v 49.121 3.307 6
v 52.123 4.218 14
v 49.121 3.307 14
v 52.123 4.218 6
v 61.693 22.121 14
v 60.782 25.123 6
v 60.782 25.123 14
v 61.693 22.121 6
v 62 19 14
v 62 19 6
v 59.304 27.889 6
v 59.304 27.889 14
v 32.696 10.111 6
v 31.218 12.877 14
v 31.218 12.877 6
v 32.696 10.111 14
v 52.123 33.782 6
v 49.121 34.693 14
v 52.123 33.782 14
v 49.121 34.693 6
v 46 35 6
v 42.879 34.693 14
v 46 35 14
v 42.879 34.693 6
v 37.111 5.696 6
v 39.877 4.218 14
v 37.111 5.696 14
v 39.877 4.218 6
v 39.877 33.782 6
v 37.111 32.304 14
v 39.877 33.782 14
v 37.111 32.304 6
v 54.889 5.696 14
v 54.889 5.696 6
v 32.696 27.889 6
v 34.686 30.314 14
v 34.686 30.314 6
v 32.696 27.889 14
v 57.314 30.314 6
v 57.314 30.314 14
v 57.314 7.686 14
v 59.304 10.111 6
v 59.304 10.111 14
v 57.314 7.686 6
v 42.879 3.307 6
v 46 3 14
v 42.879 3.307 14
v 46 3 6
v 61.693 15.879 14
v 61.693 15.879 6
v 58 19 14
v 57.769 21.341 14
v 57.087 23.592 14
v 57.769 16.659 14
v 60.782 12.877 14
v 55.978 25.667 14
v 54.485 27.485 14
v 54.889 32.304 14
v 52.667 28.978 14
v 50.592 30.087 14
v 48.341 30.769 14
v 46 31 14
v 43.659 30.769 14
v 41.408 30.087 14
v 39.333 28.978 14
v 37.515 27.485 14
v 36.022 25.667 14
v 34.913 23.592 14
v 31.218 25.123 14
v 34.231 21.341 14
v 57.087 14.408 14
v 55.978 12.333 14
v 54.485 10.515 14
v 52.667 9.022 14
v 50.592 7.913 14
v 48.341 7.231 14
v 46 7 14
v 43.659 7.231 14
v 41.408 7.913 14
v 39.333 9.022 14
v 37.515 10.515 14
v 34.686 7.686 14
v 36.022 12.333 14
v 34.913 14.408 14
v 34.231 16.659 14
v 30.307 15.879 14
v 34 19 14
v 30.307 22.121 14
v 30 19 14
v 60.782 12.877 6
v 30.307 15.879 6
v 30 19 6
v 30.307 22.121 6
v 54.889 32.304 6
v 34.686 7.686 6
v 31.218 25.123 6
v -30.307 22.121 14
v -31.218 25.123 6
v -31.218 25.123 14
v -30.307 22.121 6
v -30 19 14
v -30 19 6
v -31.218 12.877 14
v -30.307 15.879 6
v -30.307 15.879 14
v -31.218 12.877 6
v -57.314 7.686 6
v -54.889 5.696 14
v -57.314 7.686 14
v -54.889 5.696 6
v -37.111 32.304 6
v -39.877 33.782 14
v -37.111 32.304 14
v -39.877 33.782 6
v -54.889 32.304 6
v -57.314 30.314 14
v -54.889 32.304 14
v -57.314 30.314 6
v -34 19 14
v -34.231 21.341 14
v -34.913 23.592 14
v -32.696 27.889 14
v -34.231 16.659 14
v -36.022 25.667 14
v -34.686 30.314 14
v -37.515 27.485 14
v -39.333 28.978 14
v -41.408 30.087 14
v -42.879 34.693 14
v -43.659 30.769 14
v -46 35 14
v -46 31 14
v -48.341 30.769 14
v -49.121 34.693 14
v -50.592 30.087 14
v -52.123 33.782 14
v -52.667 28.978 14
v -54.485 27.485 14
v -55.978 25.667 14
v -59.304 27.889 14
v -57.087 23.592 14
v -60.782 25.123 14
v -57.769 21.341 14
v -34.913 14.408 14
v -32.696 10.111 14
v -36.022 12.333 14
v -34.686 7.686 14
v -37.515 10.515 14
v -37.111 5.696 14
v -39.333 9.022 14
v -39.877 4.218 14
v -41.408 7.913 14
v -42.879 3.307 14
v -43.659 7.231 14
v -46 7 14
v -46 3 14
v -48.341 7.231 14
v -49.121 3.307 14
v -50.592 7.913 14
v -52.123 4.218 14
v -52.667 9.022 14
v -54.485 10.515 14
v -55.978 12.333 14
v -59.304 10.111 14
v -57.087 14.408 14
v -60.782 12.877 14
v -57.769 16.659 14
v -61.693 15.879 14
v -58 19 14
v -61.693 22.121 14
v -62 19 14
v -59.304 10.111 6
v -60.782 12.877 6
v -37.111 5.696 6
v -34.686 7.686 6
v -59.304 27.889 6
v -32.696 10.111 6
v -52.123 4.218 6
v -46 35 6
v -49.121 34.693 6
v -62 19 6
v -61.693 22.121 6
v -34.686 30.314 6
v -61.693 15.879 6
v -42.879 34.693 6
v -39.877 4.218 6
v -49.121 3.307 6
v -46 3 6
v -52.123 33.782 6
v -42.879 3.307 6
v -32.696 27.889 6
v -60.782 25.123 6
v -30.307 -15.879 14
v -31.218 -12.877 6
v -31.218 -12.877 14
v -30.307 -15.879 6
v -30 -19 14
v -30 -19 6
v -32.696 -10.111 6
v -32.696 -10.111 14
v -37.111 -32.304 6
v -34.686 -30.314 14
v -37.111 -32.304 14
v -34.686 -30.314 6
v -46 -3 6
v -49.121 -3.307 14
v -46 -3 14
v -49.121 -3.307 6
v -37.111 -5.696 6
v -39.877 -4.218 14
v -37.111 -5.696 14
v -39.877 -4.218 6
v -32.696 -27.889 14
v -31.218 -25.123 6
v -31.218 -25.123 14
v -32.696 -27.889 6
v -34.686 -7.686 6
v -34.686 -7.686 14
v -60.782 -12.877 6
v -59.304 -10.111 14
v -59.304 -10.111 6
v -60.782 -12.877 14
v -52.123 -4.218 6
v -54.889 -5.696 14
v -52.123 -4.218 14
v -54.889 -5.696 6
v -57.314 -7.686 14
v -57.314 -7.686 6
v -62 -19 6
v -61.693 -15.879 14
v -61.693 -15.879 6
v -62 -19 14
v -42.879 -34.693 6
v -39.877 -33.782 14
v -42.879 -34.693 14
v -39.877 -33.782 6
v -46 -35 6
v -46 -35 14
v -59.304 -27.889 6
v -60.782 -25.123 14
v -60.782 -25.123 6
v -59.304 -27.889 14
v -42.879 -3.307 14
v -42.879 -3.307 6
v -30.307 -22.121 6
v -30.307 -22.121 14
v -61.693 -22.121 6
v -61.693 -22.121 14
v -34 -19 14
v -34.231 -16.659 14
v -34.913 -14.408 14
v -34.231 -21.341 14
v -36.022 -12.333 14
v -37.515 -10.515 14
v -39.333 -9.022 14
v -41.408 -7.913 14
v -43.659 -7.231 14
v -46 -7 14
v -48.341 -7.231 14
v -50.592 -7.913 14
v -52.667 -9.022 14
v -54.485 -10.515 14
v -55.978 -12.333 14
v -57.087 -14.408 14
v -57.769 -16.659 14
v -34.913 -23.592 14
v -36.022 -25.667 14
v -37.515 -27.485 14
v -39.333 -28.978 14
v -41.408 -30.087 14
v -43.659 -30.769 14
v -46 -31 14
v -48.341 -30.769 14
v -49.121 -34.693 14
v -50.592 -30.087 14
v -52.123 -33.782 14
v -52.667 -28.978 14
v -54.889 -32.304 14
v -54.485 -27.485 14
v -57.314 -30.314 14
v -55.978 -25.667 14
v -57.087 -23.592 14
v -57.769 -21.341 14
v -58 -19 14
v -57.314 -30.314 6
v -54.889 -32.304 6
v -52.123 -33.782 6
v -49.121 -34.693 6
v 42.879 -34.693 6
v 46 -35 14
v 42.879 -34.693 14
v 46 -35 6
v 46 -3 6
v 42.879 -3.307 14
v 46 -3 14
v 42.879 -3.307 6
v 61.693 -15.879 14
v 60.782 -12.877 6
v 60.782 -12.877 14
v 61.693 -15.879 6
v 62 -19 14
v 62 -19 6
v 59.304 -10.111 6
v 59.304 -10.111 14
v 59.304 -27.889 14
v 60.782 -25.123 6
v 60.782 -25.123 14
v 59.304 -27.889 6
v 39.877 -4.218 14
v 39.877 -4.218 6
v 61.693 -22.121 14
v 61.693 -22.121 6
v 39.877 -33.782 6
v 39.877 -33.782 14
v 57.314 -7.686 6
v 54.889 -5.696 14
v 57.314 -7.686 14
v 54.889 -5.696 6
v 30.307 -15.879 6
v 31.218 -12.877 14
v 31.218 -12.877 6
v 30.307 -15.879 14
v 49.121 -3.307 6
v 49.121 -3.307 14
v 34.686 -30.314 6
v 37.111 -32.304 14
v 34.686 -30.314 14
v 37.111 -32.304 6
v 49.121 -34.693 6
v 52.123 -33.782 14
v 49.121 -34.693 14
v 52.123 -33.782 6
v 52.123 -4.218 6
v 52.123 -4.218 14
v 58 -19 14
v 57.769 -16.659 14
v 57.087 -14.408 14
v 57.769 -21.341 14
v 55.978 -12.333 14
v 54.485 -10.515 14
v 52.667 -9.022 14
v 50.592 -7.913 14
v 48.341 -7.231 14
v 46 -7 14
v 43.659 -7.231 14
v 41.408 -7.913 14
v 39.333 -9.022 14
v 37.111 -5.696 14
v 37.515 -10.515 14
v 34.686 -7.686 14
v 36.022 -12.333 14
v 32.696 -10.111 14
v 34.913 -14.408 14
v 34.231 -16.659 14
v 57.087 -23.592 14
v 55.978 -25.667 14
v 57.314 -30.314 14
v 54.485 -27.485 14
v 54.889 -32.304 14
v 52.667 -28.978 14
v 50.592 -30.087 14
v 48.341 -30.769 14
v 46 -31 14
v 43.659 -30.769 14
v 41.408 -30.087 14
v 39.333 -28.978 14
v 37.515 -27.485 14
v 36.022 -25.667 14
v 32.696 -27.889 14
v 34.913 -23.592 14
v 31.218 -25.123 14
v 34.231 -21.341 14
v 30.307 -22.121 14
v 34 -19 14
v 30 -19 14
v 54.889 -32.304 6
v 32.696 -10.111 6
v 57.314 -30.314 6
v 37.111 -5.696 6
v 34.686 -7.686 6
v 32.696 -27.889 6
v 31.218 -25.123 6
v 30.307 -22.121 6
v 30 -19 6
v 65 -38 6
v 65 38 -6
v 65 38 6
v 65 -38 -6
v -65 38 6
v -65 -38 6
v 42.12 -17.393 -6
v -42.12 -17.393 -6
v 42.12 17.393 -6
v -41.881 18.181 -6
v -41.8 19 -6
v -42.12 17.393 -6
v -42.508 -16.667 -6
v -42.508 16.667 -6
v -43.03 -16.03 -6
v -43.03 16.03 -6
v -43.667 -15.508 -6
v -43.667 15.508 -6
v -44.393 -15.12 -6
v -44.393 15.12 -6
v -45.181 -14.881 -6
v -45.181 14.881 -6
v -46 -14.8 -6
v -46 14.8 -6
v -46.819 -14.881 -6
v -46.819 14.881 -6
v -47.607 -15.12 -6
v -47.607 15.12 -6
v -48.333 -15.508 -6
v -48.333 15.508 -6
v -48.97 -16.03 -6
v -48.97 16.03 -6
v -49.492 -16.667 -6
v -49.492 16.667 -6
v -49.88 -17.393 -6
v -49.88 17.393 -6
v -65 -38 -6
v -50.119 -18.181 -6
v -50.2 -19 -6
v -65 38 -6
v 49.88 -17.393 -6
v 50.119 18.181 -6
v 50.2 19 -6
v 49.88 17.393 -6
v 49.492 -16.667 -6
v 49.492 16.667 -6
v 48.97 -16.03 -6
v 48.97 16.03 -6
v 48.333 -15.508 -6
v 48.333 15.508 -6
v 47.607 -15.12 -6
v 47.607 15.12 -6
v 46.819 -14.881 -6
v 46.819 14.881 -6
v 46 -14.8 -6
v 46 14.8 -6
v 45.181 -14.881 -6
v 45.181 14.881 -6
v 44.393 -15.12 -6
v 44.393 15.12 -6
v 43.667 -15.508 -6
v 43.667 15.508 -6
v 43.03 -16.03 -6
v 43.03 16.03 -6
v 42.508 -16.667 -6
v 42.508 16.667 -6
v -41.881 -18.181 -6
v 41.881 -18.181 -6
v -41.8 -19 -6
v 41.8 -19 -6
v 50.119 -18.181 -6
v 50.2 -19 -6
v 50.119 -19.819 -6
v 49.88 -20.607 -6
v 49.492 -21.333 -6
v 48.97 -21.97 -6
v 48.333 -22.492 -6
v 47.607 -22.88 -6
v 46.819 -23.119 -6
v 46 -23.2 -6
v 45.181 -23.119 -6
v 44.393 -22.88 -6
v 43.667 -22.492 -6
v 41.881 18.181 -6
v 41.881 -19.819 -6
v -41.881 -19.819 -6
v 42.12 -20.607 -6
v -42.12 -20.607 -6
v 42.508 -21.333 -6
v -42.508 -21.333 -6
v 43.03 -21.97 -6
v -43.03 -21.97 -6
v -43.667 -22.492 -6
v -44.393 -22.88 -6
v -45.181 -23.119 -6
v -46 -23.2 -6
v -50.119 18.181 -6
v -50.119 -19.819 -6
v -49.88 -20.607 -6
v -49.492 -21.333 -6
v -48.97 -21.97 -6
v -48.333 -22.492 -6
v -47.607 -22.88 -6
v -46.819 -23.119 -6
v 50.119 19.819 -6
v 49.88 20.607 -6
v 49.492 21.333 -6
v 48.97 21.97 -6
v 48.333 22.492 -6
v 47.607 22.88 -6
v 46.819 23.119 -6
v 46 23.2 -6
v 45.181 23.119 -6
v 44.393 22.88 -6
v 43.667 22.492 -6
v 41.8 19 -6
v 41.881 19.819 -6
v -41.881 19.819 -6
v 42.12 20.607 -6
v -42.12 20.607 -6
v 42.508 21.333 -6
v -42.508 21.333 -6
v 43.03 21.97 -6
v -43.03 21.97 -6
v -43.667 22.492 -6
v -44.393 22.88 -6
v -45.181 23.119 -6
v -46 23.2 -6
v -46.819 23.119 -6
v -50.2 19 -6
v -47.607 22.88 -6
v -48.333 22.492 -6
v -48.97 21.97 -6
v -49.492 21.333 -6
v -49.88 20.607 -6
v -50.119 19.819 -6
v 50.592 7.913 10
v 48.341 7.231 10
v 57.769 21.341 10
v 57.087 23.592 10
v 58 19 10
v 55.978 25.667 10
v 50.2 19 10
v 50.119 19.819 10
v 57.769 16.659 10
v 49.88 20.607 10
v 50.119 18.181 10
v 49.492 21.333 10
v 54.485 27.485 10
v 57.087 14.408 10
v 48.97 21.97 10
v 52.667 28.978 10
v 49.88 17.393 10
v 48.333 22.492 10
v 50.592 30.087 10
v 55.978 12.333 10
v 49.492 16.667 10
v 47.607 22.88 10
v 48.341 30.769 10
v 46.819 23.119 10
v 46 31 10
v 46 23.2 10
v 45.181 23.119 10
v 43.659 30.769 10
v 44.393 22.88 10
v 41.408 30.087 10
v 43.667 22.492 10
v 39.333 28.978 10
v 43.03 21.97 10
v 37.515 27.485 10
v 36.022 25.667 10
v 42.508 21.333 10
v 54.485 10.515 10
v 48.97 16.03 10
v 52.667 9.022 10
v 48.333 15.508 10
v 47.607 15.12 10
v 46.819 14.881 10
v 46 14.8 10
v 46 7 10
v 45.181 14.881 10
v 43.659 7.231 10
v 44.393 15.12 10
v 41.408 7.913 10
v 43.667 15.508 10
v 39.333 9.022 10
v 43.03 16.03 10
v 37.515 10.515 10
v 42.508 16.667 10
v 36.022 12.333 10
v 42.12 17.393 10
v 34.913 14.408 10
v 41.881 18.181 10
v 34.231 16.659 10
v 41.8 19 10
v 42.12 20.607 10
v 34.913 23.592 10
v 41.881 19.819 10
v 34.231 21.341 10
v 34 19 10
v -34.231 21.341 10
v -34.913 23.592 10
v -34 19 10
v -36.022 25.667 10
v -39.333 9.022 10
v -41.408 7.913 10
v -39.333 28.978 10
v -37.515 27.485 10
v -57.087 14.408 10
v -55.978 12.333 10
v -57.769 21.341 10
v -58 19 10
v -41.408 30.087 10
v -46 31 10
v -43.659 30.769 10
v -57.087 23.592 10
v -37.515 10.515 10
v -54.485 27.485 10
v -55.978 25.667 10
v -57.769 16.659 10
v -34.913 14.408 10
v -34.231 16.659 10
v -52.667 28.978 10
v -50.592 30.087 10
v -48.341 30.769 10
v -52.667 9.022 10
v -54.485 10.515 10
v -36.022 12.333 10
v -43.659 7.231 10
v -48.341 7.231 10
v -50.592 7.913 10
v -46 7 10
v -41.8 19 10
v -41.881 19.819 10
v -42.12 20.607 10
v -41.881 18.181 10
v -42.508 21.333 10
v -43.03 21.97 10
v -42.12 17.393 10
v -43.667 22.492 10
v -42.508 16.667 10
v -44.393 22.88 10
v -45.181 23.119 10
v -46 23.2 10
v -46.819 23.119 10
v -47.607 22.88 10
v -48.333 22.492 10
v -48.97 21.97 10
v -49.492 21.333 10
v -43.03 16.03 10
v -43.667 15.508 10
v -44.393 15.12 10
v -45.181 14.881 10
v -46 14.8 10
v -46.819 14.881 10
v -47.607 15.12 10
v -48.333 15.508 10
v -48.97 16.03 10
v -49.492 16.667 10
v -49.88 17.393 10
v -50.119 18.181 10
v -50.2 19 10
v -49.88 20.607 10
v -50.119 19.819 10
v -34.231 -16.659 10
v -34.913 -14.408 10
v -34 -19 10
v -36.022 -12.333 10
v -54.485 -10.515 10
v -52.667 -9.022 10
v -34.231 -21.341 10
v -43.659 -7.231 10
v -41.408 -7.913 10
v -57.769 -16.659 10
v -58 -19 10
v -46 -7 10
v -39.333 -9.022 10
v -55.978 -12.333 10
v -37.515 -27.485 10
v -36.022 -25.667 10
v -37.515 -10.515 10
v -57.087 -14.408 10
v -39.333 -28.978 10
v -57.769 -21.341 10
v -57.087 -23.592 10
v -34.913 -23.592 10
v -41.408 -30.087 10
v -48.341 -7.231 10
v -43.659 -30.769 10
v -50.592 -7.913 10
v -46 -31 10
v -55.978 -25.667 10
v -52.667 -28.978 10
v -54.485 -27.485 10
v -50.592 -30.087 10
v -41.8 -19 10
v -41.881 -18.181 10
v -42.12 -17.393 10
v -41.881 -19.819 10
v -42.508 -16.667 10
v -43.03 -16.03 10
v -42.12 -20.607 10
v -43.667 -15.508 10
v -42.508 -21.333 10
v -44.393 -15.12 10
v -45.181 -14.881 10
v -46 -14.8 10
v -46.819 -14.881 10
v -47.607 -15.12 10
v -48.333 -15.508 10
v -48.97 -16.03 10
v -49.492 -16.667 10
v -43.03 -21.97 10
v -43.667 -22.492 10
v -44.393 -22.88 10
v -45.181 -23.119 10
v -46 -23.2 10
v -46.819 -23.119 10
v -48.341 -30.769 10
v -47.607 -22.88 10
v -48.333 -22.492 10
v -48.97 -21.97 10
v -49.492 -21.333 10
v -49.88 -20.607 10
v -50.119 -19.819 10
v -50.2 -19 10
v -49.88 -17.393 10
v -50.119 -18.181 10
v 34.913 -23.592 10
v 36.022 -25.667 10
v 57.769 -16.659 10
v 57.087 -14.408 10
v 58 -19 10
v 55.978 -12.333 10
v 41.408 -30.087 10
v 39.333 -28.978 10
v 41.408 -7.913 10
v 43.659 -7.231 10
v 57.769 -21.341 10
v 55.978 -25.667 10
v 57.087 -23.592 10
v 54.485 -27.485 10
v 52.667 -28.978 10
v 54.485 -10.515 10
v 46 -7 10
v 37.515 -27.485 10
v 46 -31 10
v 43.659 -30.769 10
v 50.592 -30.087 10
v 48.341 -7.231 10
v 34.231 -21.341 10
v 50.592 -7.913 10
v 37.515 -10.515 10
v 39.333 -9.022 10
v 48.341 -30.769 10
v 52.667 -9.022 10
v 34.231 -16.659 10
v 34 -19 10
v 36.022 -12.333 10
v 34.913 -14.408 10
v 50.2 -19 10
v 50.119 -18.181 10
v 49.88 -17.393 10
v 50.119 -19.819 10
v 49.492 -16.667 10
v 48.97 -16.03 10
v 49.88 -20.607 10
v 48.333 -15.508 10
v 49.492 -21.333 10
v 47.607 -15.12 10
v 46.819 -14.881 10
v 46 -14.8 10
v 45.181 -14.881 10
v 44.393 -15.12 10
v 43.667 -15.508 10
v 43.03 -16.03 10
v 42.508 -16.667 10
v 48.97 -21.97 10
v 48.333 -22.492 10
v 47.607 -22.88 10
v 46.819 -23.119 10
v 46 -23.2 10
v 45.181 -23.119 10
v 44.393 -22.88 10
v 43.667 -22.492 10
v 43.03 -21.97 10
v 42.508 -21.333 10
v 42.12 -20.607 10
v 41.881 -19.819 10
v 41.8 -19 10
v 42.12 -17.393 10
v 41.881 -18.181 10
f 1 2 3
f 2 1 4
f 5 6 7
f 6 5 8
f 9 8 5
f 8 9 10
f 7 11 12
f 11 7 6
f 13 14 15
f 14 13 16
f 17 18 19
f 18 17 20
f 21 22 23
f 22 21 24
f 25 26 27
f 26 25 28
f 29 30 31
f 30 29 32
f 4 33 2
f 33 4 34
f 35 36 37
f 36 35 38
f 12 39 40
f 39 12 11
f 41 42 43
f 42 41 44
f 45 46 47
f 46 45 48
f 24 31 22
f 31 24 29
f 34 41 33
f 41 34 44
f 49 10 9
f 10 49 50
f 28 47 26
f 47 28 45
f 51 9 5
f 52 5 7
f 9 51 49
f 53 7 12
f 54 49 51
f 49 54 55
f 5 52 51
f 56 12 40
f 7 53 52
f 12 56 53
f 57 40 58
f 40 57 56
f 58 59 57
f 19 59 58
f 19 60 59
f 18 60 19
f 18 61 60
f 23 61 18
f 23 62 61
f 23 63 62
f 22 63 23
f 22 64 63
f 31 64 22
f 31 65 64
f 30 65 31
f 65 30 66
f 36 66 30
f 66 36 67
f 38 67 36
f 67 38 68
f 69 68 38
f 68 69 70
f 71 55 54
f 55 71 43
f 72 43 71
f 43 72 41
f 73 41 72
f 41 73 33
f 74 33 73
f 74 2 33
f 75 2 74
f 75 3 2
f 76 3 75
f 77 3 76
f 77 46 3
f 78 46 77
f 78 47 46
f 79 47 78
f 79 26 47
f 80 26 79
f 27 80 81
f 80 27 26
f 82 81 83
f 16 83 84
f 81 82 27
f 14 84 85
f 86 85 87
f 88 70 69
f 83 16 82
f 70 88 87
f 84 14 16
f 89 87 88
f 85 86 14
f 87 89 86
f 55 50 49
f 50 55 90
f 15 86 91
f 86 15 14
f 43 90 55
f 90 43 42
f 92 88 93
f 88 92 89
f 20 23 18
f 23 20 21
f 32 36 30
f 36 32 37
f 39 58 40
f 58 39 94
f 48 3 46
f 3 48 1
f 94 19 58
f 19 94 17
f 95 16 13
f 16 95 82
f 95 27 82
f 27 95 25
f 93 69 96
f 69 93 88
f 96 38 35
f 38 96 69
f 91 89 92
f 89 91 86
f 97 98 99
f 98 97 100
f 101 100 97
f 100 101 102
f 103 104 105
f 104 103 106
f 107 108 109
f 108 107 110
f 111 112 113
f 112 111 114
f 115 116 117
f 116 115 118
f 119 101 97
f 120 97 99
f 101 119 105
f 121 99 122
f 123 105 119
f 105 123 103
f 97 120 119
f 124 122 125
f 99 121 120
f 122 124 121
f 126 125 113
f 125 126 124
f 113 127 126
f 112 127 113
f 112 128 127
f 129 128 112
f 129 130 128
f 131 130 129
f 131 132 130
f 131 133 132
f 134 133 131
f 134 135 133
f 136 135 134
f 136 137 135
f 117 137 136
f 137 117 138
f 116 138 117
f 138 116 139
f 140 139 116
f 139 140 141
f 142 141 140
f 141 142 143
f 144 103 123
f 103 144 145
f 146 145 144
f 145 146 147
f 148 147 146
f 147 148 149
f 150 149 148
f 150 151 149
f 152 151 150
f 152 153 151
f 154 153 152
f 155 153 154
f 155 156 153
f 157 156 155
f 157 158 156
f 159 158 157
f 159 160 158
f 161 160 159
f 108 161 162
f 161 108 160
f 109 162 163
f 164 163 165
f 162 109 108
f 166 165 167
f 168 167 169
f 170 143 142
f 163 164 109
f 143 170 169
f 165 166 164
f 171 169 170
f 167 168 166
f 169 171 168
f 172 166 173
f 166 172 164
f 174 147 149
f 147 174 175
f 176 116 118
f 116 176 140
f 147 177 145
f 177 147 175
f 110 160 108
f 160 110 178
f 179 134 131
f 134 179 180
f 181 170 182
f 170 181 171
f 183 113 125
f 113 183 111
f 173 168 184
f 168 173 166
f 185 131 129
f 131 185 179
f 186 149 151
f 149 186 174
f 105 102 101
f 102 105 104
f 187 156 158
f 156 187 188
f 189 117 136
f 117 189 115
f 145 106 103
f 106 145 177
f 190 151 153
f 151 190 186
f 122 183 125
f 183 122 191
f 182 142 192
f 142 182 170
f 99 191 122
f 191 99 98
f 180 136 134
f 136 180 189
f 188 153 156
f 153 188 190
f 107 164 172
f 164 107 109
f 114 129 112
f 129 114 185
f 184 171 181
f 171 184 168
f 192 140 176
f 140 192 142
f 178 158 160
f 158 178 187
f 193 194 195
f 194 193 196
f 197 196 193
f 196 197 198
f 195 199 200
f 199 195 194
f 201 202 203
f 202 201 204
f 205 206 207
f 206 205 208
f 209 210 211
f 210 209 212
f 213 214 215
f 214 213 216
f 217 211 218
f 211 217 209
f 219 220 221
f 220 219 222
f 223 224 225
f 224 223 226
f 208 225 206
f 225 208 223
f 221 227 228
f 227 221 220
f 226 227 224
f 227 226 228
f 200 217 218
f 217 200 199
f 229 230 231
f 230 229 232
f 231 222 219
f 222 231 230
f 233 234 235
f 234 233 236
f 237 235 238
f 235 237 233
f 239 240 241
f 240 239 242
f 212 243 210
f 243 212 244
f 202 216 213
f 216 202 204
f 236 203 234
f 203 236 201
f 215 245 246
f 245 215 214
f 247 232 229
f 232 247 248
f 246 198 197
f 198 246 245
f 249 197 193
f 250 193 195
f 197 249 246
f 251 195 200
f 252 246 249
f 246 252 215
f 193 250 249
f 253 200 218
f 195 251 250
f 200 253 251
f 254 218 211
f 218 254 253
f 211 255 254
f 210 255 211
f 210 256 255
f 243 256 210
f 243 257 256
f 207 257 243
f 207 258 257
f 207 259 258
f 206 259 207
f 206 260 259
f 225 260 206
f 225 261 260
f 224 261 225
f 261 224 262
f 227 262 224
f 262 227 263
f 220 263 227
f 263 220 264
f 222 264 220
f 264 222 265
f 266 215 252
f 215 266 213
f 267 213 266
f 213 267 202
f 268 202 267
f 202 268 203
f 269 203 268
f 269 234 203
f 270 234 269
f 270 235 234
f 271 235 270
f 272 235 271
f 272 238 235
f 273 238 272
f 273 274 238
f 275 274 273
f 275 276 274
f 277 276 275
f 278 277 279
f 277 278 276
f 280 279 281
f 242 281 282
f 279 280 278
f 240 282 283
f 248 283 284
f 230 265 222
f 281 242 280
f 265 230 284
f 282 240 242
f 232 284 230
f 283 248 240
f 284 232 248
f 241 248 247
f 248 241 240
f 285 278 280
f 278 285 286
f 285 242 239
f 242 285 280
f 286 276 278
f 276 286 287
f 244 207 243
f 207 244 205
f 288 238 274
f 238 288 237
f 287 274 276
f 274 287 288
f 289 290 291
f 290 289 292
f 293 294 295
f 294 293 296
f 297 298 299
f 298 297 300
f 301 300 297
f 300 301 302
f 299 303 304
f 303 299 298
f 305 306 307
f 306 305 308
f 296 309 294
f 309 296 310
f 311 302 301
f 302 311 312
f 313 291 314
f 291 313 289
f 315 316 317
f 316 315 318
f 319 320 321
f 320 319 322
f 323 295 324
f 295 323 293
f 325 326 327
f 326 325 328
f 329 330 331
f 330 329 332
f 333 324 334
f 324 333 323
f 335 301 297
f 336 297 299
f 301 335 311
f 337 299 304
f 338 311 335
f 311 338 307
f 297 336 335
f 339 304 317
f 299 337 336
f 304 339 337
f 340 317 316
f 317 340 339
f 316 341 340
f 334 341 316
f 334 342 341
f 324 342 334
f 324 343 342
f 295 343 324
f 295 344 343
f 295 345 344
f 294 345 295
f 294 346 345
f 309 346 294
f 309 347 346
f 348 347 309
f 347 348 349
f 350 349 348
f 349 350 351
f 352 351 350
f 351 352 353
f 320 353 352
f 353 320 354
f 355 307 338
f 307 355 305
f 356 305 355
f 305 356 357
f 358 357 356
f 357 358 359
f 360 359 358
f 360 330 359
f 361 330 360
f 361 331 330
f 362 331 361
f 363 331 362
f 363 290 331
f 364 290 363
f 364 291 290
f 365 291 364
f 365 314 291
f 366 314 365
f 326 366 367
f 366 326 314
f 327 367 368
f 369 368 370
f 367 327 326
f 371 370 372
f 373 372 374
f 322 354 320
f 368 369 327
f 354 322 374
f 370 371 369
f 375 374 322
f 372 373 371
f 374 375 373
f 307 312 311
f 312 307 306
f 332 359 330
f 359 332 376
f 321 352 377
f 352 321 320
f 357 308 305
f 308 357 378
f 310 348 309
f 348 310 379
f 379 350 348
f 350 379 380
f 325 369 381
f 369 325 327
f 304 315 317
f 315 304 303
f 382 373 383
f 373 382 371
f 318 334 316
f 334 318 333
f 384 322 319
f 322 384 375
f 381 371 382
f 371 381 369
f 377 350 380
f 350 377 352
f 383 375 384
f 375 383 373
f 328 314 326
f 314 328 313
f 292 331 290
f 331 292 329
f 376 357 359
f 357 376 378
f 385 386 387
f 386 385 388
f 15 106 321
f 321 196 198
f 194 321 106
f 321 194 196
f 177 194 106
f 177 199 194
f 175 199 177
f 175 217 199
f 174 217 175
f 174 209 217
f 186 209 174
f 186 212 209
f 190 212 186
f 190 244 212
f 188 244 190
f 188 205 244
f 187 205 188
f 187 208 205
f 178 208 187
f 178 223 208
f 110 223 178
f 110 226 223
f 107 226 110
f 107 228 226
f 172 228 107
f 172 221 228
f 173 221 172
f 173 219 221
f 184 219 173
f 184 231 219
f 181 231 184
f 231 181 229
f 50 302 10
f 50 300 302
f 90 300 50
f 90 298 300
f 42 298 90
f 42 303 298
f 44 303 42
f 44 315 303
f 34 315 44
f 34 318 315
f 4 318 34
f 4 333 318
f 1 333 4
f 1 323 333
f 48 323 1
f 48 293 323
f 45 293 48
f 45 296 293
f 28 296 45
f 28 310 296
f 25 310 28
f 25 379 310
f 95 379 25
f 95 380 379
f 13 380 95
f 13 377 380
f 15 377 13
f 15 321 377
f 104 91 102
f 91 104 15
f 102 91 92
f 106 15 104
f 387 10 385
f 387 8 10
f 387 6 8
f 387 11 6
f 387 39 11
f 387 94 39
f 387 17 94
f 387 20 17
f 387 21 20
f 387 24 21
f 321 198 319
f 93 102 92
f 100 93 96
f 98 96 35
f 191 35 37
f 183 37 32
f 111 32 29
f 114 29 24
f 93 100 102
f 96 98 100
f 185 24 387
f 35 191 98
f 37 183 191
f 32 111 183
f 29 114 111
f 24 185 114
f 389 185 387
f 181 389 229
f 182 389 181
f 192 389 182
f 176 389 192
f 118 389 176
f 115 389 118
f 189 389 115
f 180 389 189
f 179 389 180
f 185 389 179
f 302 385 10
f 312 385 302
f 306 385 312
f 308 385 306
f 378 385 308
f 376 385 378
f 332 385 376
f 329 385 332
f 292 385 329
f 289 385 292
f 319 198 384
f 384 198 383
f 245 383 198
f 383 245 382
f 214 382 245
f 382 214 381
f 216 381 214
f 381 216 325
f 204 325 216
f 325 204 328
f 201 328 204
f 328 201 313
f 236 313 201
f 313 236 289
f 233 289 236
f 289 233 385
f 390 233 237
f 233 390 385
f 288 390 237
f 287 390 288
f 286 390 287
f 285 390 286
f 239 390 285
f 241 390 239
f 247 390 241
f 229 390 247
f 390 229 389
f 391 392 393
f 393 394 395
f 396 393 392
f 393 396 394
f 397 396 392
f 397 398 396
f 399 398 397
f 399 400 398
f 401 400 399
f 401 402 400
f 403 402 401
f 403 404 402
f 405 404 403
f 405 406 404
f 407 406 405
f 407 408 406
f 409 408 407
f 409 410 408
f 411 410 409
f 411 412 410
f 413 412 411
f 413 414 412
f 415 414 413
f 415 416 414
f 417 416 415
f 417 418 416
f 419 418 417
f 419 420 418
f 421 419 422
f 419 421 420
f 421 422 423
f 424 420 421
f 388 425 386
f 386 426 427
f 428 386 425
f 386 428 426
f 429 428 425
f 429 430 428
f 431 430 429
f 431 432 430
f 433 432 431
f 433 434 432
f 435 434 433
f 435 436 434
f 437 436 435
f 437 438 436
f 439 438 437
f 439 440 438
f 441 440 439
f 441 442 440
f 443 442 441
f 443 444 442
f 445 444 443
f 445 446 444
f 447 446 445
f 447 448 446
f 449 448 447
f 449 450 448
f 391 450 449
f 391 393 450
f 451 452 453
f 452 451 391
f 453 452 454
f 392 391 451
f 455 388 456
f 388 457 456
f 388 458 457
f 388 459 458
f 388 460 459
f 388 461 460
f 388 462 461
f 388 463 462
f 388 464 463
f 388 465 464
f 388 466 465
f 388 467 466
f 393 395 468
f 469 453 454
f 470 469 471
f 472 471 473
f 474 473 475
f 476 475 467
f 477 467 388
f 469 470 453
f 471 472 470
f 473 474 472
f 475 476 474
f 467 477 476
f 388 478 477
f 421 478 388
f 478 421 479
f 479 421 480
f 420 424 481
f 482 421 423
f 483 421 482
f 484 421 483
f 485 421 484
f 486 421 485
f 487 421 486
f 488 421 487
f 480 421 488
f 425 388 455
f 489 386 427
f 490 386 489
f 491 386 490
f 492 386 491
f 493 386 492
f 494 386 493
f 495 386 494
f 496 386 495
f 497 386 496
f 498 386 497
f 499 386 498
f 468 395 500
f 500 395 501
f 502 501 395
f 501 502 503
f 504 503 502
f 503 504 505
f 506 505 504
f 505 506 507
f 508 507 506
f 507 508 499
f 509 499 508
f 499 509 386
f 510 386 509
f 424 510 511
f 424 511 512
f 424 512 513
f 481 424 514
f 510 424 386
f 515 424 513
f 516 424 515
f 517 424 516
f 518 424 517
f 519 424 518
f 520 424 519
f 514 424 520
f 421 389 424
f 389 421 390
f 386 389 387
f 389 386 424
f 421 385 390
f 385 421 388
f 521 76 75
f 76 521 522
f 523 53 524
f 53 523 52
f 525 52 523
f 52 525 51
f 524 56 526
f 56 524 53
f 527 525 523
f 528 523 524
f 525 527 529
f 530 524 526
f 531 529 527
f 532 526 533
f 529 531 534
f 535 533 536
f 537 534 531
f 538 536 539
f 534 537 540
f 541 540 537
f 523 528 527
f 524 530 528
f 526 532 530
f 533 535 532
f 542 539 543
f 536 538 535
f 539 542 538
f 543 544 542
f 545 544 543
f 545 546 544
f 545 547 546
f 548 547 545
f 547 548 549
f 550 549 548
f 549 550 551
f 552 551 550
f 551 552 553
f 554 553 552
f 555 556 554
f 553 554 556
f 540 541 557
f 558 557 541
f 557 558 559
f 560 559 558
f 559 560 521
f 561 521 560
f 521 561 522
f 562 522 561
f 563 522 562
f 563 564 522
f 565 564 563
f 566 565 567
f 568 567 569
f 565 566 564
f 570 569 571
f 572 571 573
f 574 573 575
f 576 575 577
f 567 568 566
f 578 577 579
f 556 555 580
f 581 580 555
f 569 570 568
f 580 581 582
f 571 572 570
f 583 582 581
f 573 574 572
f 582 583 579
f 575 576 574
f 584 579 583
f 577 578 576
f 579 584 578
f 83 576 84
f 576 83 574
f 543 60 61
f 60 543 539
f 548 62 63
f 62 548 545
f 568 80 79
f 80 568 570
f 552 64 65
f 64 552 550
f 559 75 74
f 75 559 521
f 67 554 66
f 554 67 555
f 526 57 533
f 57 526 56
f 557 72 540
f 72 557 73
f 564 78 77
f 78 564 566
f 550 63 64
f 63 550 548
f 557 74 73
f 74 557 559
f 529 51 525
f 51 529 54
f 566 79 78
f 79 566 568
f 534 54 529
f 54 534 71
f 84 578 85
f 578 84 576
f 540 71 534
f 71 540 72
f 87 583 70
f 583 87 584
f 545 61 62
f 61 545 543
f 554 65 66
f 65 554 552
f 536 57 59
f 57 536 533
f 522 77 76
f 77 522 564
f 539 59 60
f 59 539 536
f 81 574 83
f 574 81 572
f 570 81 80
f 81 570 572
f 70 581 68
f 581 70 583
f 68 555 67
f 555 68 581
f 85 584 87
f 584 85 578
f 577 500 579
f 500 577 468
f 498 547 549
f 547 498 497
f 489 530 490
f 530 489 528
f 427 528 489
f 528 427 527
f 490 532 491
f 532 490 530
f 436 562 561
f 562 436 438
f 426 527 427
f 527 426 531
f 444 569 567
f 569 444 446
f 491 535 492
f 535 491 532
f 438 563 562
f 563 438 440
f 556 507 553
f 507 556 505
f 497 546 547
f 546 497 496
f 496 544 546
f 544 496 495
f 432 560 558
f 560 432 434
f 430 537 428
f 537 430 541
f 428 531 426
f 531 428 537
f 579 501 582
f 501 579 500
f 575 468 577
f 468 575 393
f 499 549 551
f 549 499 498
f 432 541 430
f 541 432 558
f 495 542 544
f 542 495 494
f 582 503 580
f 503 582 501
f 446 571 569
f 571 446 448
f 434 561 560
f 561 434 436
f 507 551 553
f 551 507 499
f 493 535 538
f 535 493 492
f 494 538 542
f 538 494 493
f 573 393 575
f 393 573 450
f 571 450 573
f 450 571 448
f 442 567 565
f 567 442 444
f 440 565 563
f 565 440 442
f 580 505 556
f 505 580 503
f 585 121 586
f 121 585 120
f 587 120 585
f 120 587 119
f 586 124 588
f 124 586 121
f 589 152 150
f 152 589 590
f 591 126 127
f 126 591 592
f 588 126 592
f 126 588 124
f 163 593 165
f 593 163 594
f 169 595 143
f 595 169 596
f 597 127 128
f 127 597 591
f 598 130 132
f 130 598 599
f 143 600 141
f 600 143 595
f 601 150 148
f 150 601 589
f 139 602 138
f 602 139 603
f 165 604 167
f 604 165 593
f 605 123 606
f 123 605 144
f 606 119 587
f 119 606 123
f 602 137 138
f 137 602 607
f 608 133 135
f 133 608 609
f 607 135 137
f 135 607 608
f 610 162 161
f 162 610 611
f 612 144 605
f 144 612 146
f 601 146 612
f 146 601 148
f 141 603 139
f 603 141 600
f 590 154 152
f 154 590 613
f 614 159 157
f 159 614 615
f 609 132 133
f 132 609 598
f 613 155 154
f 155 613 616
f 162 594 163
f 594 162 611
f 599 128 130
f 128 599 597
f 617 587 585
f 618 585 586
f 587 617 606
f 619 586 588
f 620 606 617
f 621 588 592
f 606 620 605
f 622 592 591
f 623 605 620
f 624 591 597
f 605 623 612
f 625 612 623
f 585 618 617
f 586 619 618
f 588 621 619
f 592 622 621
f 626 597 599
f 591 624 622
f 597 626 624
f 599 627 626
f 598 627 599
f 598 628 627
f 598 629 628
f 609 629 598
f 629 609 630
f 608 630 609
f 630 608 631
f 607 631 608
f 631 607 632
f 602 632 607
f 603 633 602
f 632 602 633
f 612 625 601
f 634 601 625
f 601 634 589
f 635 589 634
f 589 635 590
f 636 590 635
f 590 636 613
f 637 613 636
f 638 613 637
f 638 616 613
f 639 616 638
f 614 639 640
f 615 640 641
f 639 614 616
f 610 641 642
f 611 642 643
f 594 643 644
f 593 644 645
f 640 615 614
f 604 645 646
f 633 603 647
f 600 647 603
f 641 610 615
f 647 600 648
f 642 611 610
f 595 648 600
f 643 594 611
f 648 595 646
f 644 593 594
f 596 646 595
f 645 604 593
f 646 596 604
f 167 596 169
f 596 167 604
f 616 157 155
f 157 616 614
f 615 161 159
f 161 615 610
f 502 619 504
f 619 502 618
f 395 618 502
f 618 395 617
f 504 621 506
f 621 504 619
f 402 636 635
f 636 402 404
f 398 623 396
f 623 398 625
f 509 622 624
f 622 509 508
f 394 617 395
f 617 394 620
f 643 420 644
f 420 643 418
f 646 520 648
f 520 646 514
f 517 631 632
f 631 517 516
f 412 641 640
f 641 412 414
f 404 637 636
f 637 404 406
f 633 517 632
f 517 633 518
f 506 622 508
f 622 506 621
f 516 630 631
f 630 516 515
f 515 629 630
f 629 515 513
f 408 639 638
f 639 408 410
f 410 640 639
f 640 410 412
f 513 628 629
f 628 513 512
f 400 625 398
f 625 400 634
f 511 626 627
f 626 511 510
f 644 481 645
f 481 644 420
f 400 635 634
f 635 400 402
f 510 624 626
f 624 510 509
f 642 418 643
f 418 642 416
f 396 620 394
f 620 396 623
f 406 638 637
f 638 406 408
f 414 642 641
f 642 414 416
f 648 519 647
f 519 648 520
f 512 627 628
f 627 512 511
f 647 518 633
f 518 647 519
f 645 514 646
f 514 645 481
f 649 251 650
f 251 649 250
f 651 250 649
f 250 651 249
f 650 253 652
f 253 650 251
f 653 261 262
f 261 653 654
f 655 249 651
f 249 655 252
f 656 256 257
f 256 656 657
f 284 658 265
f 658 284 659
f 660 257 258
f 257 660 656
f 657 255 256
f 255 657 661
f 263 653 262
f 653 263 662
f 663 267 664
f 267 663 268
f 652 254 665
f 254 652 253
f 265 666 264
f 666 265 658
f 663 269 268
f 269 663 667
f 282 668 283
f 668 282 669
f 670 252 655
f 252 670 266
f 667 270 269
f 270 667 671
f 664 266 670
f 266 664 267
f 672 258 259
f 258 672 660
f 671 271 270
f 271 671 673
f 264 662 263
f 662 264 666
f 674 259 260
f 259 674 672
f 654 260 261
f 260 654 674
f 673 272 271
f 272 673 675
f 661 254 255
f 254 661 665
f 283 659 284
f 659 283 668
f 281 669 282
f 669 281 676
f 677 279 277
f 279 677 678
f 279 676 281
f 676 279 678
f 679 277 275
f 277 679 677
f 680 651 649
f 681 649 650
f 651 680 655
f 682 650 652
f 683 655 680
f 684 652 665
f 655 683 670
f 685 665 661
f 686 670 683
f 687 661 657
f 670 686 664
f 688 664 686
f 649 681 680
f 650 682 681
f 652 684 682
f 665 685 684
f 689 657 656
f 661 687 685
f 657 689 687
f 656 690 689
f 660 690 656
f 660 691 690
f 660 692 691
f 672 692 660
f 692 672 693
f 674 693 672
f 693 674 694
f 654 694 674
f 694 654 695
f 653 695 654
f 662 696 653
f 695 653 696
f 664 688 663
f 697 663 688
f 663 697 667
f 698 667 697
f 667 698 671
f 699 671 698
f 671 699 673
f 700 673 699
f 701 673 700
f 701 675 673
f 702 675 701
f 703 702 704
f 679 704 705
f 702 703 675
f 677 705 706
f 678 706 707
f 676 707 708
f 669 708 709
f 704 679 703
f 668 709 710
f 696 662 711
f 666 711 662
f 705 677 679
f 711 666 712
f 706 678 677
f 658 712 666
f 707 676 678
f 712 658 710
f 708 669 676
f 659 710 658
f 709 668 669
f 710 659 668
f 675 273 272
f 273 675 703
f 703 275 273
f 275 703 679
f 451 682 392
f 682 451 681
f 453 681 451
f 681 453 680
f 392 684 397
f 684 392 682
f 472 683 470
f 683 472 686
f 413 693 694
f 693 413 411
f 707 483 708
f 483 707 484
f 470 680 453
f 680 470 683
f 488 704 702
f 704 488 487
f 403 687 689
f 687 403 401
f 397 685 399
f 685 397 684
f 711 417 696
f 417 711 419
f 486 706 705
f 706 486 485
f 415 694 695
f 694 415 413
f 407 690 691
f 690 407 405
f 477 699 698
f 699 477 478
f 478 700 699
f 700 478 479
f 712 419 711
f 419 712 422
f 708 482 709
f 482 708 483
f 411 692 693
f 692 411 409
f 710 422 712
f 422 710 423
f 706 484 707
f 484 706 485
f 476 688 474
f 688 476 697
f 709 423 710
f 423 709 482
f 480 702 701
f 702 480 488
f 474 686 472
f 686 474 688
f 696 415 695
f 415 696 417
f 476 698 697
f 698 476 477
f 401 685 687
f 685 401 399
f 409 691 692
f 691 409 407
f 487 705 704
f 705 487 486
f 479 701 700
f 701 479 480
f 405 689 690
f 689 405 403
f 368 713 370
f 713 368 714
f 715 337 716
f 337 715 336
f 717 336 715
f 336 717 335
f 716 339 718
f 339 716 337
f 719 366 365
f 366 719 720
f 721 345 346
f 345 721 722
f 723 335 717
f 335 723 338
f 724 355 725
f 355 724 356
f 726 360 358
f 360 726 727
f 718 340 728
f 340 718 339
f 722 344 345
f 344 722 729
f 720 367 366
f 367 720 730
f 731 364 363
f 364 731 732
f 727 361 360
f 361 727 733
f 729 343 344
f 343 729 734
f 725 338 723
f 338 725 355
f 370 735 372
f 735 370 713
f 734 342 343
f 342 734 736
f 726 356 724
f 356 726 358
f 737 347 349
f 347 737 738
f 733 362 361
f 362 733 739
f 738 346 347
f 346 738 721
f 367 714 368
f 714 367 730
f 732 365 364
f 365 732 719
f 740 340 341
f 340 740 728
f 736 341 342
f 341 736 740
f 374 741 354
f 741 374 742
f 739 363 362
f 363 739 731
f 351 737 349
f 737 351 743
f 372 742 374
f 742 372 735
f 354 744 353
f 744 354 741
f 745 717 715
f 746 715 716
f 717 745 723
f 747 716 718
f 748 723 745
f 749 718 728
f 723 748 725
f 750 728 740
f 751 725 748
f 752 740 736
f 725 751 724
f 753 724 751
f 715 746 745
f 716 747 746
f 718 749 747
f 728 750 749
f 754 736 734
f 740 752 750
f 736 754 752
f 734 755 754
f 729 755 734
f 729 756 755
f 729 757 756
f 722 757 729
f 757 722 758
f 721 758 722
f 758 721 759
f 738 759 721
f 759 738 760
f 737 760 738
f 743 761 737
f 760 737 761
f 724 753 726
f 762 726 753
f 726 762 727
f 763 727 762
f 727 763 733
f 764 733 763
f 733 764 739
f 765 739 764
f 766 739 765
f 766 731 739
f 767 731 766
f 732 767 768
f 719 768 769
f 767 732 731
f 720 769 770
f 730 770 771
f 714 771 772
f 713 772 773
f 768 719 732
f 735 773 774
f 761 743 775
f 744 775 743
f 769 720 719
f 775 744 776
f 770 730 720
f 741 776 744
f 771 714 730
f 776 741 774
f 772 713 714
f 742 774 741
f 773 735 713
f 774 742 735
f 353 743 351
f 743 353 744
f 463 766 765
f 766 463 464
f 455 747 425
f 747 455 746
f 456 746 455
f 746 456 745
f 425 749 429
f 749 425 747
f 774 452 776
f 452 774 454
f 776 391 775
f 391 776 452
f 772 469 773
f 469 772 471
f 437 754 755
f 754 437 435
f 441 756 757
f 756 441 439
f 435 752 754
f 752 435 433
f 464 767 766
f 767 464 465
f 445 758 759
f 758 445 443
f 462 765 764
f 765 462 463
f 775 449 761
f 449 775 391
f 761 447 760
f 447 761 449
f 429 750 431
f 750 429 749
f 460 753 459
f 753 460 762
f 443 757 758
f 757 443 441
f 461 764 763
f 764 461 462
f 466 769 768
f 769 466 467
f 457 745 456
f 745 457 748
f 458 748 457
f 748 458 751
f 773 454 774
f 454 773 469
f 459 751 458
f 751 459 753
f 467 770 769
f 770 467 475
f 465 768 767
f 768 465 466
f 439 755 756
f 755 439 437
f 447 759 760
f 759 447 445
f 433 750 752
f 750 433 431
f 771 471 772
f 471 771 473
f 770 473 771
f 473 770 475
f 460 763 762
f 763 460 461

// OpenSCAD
$fn = 32;

// ----------------------------------------------------------------------
// Socket pad plate
// bosses with counterbored sockets for the screws
// ----------------------------------------------------------------------

// --- parameters (mm) ---
base_t = 12;            // base plate thickness
seat_tol = 0.15;        // tolerance at the seating features
free_tol = 0.5;         // general tolerance on the free sizes
boss_h = 8;             // boss height above the base plate
boss_d = 32;            // boss diameter
socket_d = 24;          // socket diameter
socket_depth = 4;       // socket depth from the boss face
bolt_d = 8.4;           // screw clearance hole through the socket floor
plate = [130, 76, 12];  // overall size (x, y, z)
edge = 19;              // boss centre offset from the plate edge
pads = 4;               // boss count, one per corner

// --- derived feature positions (mm) ---
height = base_t + boss_h;        // = 20   overall height of the part
corner_x = plate[0] / 2 - edge;  // = 46   boss centre X
corner_y = plate[1] / 2 - edge;  // = 19   boss centre Y
feature_centers = [
  [corner_x, corner_y],
  [-corner_x, corner_y],
  [-corner_x, -corner_y],
  [corner_x, -corner_y]
];   // boss centres: sockets, holes and the pads themselves are placed from here

// base plate, bosses on feature_centers, socket + through hole in each
difference() {
  union() {
    cube(plate, center = true);
    for (centre = feature_centers)
      translate([centre[0], centre[1], plate[2] / 2 - 1])
        cylinder(d = boss_d, h = boss_h + 1);
  }
  for (centre = feature_centers) {
    translate([centre[0], centre[1], plate[2] / 2 + boss_h - socket_depth])
      cylinder(d = socket_d, h = socket_depth + 1);
    translate([centre[0], centre[1], -height])
      cylinder(d = bolt_d, h = 2 * height + 2);  // through the socket floor
  }
}
